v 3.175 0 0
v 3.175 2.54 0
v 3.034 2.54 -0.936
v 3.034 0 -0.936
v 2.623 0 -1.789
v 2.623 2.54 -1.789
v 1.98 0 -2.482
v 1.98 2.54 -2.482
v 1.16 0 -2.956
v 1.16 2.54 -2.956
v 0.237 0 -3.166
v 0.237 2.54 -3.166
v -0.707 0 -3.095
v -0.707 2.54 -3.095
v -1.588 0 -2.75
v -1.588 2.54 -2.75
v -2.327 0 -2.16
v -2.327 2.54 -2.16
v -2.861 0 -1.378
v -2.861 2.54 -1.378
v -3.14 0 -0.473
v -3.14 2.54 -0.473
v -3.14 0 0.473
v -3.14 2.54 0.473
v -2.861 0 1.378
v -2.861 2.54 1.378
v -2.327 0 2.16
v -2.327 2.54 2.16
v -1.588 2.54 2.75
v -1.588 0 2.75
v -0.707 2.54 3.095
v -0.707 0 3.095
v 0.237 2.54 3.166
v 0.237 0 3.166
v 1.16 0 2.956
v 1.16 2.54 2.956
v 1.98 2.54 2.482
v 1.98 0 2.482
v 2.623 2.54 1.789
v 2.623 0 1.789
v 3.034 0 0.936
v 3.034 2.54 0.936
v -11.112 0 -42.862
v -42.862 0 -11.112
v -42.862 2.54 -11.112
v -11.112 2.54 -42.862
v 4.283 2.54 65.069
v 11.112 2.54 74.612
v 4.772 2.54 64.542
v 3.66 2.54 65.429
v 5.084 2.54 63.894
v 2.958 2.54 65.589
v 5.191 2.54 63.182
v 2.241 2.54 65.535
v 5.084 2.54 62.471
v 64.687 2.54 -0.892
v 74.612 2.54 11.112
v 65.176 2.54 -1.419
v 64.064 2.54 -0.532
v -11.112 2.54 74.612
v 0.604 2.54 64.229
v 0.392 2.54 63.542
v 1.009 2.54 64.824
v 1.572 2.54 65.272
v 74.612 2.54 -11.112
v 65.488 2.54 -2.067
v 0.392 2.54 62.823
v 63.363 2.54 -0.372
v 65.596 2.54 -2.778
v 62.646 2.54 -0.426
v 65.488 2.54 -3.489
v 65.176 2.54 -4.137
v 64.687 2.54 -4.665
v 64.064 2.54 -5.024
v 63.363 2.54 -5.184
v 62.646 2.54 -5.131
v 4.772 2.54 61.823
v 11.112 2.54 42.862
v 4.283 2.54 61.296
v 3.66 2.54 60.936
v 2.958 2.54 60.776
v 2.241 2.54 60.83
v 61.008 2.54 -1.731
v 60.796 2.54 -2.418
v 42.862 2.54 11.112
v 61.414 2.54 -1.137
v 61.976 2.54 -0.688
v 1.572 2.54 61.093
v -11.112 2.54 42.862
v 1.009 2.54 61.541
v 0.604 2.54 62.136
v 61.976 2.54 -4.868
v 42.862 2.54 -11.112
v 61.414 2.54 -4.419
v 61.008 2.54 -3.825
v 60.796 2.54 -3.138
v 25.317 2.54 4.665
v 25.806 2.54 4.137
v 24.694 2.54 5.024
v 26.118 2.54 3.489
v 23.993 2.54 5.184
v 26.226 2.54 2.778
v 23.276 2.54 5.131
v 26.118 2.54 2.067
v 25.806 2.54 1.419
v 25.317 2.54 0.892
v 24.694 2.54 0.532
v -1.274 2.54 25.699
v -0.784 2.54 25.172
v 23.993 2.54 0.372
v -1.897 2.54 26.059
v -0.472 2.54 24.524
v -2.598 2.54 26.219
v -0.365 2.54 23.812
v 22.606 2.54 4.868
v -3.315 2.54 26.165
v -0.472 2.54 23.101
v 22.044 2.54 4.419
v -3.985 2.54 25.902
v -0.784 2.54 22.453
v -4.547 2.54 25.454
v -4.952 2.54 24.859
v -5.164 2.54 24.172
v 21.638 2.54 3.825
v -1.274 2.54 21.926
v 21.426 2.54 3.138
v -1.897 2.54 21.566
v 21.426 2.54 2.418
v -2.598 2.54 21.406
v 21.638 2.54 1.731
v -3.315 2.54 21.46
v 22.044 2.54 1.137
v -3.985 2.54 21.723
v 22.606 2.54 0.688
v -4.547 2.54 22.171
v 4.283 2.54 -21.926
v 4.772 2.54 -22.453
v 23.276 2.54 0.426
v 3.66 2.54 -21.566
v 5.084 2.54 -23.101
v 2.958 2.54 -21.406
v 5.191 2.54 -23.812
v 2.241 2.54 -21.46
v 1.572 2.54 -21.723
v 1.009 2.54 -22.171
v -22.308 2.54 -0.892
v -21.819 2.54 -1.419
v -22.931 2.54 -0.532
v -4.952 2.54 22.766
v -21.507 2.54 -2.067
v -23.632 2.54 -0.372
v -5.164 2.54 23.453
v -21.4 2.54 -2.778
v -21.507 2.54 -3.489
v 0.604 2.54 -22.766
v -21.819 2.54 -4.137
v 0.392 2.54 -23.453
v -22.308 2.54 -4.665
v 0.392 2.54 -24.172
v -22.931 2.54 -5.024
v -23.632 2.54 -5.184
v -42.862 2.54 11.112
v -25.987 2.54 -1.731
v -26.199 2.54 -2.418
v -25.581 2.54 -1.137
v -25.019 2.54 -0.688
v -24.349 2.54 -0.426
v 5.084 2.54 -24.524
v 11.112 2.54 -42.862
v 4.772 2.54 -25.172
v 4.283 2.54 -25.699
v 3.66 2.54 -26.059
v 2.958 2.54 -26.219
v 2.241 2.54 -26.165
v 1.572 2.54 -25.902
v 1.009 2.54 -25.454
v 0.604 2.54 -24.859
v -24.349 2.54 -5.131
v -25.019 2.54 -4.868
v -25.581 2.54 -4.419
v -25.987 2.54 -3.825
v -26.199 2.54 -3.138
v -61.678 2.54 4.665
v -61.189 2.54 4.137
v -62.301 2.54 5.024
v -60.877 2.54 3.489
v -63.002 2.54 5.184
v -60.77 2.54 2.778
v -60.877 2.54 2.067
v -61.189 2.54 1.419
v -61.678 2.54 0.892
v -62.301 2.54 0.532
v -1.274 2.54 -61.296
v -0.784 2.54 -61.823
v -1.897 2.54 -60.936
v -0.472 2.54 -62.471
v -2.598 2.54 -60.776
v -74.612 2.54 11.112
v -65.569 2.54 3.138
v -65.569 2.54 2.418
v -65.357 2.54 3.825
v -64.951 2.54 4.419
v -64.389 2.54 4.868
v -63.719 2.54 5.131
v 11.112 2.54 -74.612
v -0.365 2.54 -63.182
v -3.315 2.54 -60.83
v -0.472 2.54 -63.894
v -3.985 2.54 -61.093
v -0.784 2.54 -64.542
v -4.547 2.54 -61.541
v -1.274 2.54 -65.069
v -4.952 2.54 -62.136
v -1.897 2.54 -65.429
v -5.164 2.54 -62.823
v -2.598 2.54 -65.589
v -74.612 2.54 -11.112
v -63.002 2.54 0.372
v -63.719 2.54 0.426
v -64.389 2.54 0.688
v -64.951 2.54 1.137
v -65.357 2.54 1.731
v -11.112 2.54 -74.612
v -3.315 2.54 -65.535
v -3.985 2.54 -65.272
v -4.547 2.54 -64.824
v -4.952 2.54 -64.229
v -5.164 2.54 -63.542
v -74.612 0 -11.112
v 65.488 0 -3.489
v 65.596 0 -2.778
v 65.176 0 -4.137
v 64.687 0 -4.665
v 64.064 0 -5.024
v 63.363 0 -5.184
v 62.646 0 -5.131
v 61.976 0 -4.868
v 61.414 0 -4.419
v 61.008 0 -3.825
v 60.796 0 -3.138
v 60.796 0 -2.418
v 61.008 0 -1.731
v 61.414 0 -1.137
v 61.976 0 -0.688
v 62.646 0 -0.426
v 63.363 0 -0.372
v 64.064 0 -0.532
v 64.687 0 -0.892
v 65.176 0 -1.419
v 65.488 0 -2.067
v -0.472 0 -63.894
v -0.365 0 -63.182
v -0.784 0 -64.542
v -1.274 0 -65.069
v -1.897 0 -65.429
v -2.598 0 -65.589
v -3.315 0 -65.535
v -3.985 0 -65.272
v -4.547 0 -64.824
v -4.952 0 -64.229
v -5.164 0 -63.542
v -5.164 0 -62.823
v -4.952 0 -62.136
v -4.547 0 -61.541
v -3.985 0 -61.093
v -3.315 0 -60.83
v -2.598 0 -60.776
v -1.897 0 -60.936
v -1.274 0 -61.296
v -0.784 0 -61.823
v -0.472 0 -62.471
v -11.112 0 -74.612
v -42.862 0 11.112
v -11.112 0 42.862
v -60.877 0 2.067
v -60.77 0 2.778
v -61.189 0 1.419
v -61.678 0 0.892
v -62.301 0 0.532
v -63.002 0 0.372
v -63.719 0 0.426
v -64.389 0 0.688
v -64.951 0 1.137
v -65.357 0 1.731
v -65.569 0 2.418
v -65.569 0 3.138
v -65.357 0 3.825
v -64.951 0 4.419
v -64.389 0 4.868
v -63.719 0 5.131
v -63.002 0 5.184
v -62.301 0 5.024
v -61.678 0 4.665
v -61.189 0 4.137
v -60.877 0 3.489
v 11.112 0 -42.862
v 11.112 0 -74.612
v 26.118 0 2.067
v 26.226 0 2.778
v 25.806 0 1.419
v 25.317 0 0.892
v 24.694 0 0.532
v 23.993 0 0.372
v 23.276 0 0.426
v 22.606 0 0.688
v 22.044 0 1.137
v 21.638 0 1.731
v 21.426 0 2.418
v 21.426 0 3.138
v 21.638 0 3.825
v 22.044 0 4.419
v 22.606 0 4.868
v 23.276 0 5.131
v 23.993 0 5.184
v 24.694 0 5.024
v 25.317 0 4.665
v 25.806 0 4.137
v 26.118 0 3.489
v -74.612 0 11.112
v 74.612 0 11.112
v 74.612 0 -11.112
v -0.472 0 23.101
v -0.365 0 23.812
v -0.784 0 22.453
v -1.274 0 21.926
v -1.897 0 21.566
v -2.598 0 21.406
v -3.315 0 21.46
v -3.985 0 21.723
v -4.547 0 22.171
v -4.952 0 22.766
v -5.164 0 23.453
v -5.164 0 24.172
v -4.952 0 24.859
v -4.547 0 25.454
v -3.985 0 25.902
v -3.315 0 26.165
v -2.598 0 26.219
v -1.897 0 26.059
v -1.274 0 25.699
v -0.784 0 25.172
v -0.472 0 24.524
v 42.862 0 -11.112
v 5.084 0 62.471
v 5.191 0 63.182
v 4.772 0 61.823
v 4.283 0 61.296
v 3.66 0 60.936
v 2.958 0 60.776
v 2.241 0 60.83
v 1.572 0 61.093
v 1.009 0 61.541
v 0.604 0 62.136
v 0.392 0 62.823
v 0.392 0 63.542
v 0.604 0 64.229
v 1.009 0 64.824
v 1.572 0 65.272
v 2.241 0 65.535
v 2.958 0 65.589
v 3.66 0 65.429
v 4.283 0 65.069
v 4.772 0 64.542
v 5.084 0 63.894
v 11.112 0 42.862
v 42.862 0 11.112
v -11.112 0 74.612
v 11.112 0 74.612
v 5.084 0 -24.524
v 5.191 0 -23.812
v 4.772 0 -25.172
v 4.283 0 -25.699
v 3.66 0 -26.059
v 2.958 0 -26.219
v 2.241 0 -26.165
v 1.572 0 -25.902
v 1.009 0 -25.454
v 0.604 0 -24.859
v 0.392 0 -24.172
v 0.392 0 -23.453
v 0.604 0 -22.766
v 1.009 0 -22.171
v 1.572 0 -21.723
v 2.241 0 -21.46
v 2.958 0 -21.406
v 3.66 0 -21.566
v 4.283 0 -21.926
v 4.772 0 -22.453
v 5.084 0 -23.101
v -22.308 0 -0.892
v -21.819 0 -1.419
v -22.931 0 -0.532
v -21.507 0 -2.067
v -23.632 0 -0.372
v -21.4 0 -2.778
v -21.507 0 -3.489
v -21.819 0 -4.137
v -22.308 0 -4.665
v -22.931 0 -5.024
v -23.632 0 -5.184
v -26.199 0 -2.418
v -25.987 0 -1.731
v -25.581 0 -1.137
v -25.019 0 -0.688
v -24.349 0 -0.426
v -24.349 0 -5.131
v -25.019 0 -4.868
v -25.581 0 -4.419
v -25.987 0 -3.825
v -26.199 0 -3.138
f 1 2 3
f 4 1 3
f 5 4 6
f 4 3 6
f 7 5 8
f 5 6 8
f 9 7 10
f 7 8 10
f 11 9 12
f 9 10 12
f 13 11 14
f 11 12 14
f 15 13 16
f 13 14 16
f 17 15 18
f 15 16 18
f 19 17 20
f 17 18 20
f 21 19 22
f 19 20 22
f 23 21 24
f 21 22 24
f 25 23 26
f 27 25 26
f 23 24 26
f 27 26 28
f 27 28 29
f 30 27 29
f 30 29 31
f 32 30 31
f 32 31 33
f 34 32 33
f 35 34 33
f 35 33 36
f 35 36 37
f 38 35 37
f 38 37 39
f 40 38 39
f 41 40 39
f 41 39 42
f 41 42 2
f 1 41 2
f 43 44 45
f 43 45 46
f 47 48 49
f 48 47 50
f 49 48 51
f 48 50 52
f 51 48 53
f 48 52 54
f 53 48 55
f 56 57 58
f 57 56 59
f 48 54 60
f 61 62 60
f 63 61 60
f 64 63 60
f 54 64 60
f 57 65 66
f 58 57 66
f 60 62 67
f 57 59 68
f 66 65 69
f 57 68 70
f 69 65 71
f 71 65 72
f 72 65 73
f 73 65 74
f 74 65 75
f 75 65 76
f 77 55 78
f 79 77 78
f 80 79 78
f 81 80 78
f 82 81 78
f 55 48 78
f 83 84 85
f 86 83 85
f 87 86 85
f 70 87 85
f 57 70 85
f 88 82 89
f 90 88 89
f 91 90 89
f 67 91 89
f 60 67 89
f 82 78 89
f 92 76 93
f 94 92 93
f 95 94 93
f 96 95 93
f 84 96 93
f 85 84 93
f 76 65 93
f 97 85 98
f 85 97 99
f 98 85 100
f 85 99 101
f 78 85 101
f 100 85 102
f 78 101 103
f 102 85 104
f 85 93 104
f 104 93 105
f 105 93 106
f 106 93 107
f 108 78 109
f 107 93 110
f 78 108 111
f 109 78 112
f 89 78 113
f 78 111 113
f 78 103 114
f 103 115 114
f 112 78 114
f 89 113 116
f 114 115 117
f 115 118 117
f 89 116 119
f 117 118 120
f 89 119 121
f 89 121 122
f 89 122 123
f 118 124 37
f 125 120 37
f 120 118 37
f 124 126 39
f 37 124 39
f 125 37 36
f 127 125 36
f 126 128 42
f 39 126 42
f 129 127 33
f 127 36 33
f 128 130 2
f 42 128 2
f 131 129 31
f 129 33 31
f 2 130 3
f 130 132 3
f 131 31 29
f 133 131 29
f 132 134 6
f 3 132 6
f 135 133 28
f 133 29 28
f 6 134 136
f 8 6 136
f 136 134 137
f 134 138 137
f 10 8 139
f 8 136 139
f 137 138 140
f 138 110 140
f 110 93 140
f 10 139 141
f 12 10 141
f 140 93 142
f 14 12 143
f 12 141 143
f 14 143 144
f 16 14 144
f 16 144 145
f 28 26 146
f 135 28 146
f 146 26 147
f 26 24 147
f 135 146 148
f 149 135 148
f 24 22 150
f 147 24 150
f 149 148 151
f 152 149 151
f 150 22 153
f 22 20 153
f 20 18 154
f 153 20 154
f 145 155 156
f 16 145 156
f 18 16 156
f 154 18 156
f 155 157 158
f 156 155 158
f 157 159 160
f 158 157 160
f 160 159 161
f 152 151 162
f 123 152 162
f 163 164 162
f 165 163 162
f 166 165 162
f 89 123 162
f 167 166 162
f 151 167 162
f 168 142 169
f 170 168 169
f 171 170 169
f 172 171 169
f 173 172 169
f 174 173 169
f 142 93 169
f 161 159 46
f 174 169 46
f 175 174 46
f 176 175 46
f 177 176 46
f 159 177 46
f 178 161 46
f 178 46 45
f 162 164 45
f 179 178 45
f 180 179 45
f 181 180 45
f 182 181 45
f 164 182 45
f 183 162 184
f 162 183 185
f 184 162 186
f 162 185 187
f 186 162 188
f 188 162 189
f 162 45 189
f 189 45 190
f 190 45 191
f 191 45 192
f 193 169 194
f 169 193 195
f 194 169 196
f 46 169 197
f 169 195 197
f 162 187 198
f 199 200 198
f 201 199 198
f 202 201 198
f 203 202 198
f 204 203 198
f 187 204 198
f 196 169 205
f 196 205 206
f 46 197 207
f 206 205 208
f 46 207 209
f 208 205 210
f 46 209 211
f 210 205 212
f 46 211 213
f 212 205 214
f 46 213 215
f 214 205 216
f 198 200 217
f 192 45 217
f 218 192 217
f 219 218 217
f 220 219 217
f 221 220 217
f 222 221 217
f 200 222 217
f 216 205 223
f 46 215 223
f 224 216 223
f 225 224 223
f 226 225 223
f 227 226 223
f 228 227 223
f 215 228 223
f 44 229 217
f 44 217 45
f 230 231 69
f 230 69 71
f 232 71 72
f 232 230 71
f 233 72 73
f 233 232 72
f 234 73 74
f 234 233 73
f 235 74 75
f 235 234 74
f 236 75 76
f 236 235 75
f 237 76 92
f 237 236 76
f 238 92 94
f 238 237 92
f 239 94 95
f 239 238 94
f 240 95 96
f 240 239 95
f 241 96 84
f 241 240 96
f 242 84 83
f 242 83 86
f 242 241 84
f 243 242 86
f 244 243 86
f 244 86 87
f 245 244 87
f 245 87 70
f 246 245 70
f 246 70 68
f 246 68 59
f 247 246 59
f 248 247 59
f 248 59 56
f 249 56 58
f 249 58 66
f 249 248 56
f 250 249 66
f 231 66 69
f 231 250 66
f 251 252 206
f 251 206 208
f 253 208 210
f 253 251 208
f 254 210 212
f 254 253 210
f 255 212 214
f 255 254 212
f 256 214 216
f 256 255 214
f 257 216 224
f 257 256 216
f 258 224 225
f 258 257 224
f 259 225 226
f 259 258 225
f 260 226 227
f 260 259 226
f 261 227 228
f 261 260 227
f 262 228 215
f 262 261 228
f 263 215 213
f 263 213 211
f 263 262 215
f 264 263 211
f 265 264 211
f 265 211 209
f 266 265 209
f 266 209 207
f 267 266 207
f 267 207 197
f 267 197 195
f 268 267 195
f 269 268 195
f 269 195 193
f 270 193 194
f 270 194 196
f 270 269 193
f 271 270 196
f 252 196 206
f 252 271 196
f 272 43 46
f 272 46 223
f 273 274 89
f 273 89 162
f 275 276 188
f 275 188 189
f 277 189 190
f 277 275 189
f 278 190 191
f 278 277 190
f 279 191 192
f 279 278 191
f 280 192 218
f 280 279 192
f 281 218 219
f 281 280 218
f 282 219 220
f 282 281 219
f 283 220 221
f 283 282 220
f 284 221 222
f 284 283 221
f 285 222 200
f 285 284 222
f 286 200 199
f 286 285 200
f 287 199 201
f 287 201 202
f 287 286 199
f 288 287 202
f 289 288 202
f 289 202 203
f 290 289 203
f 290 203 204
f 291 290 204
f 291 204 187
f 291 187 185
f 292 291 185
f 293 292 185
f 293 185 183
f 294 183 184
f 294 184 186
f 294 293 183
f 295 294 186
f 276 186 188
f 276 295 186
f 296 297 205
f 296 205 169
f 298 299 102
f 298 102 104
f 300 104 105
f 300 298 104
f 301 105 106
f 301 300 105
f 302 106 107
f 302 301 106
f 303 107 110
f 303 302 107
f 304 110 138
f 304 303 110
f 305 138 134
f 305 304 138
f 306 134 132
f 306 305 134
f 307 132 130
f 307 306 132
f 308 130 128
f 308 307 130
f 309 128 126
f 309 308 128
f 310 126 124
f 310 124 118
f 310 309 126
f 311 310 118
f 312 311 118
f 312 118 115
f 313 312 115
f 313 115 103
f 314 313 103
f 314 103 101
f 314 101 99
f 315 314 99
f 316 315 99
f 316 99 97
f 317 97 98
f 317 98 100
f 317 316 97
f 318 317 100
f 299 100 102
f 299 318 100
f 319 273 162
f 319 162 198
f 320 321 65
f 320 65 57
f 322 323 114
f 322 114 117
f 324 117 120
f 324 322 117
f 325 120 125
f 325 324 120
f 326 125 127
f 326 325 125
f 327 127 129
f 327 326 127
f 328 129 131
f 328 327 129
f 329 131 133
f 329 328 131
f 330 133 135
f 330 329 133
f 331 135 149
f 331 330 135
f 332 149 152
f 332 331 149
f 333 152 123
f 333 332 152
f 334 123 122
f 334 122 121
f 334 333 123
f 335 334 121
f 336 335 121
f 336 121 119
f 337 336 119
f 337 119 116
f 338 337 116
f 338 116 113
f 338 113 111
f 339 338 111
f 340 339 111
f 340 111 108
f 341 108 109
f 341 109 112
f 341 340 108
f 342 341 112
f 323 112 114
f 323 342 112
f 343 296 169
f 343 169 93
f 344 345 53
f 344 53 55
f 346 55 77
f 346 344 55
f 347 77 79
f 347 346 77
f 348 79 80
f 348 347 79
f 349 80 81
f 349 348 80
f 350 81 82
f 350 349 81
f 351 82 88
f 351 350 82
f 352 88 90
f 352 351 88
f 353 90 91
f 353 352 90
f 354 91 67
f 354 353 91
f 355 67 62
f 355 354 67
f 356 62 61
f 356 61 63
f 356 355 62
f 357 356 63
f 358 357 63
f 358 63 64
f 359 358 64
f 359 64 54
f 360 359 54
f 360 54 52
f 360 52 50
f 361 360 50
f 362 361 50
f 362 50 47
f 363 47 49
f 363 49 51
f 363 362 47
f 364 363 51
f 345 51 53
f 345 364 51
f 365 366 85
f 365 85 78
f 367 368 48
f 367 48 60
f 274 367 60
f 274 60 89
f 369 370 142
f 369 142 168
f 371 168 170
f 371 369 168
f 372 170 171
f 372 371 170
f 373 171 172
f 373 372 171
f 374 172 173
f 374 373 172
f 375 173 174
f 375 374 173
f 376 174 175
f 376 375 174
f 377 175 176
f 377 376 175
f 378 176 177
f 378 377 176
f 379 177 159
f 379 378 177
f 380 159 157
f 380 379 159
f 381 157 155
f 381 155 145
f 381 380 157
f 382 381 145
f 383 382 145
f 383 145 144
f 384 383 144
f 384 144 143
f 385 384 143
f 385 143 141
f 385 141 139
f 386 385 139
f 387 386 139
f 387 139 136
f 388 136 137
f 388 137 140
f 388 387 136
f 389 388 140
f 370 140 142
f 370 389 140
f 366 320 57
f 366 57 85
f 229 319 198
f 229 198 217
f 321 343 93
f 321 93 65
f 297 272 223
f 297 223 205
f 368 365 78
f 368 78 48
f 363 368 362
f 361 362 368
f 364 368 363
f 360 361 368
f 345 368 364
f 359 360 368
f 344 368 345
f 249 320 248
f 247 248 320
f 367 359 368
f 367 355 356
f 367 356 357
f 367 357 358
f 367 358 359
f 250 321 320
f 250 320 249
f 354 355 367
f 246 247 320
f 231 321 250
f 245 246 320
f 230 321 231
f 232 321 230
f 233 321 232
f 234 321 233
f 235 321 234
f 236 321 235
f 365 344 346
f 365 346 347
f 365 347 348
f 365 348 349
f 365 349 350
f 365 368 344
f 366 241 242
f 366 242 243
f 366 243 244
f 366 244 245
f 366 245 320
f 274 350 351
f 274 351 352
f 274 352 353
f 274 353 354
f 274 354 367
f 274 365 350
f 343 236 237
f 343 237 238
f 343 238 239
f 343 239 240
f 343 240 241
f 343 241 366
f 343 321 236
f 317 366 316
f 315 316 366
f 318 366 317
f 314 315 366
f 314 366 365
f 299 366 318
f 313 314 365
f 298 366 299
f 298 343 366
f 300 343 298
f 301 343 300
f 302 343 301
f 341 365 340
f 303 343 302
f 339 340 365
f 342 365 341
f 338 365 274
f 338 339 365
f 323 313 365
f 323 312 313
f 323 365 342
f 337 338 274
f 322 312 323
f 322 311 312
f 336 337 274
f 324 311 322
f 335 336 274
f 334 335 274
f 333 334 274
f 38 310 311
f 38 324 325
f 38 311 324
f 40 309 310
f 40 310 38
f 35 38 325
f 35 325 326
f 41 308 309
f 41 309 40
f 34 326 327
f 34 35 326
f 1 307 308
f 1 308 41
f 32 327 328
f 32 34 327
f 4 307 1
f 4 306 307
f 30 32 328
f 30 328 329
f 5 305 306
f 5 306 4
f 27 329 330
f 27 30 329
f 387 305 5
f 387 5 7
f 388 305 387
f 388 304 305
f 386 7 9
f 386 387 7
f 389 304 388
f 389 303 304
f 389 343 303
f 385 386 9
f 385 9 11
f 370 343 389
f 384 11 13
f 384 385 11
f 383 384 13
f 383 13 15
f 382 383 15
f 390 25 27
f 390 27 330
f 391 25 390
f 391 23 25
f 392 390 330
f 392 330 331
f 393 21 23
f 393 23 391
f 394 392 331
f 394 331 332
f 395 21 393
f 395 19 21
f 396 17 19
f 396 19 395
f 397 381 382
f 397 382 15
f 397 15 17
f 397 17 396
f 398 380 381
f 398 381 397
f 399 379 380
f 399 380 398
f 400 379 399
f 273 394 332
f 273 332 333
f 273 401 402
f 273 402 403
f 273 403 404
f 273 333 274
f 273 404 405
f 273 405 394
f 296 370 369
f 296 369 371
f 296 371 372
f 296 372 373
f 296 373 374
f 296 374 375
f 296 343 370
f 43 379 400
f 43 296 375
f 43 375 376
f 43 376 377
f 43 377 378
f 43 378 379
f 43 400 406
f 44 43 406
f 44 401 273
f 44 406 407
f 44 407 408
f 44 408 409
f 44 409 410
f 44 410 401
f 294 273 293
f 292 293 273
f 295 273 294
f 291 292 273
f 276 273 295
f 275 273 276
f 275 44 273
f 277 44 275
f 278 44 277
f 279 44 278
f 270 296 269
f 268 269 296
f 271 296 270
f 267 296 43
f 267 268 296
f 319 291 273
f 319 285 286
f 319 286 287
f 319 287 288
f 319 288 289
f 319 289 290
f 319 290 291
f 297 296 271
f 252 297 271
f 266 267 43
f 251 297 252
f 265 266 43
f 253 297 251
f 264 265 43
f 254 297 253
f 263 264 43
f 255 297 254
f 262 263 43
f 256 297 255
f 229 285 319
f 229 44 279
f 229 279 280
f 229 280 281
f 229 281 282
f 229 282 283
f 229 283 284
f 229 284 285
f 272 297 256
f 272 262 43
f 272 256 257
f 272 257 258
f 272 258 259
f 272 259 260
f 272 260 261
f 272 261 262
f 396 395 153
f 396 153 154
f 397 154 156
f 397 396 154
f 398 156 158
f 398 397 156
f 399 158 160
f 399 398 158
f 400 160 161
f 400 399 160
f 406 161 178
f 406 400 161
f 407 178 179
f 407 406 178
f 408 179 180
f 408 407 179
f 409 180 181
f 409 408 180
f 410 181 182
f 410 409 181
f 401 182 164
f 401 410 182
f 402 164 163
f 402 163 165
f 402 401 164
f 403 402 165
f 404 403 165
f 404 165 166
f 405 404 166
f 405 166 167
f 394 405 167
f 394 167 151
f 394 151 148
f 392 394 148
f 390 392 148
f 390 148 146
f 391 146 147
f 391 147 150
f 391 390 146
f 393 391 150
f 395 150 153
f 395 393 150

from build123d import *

# Parameters (mm, degrees)
SKETCH1_R           = 2.413
BOSS_EXTRUDE1_DEPTH = 2.54
SKETCH2_R           = 3.175
CUT_EXTRUDE1_DEPTH  = 3.54


with BuildPart() as part:
    # Sketch1 → Boss-Extrude1 (new body)
    with BuildSketch(Plane(origin=(0, 0, 0), x_dir=(1, 0, 0), z_dir=(0, 1, 0))):
        Polygon((-74.6125, -11.1125), (-74.6125, 11.1125), (-42.8625, 11.1125), (-11.1125, 42.8625), (-11.1125, 74.6125), (11.1125, 74.6125), (11.1125, 42.8625), (42.8625, 11.1125), (74.6125, 11.1125), (74.6125, -11.1125), (42.8625, -11.1125), (11.1125, -42.8625), (11.1125, -74.6125), (-11.1125, -74.6125), (-11.1125, -42.8625), (-42.8625, -11.1125), align=None)
        with Locations((-23.8125, 2.778125)):
            Circle(SKETCH1_R, mode=Mode.SUBTRACT)
        with Locations((-63.1825, -2.778125)):
            Circle(SKETCH1_R, mode=Mode.SUBTRACT)
        with Locations((-2.778125, 63.1825)):
            Circle(SKETCH1_R, mode=Mode.SUBTRACT)
        with Locations((2.778125, 23.8125)):
            Circle(SKETCH1_R, mode=Mode.SUBTRACT)
        with Locations((63.1825, 2.778125)):
            Circle(SKETCH1_R, mode=Mode.SUBTRACT)
        with Locations((23.8125, -2.778125)):
            Circle(SKETCH1_R, mode=Mode.SUBTRACT)
        with Locations((2.778125, -63.1825)):
            Circle(SKETCH1_R, mode=Mode.SUBTRACT)
        with Locations((-2.778125, -23.8125)):
            Circle(SKETCH1_R, mode=Mode.SUBTRACT)
    extrude(amount=BOSS_EXTRUDE1_DEPTH)

    # Sketch2 → Cut-Extrude1 (cut, through all)
    with BuildSketch(Plane(origin=(0, 2.54, 0), x_dir=(1, 0, 0), z_dir=(0, 1, 0))):
        Circle(SKETCH2_R)
    extrude(amount=-CUT_EXTRUDE1_DEPTH, mode=Mode.SUBTRACT)


solid = part.part
